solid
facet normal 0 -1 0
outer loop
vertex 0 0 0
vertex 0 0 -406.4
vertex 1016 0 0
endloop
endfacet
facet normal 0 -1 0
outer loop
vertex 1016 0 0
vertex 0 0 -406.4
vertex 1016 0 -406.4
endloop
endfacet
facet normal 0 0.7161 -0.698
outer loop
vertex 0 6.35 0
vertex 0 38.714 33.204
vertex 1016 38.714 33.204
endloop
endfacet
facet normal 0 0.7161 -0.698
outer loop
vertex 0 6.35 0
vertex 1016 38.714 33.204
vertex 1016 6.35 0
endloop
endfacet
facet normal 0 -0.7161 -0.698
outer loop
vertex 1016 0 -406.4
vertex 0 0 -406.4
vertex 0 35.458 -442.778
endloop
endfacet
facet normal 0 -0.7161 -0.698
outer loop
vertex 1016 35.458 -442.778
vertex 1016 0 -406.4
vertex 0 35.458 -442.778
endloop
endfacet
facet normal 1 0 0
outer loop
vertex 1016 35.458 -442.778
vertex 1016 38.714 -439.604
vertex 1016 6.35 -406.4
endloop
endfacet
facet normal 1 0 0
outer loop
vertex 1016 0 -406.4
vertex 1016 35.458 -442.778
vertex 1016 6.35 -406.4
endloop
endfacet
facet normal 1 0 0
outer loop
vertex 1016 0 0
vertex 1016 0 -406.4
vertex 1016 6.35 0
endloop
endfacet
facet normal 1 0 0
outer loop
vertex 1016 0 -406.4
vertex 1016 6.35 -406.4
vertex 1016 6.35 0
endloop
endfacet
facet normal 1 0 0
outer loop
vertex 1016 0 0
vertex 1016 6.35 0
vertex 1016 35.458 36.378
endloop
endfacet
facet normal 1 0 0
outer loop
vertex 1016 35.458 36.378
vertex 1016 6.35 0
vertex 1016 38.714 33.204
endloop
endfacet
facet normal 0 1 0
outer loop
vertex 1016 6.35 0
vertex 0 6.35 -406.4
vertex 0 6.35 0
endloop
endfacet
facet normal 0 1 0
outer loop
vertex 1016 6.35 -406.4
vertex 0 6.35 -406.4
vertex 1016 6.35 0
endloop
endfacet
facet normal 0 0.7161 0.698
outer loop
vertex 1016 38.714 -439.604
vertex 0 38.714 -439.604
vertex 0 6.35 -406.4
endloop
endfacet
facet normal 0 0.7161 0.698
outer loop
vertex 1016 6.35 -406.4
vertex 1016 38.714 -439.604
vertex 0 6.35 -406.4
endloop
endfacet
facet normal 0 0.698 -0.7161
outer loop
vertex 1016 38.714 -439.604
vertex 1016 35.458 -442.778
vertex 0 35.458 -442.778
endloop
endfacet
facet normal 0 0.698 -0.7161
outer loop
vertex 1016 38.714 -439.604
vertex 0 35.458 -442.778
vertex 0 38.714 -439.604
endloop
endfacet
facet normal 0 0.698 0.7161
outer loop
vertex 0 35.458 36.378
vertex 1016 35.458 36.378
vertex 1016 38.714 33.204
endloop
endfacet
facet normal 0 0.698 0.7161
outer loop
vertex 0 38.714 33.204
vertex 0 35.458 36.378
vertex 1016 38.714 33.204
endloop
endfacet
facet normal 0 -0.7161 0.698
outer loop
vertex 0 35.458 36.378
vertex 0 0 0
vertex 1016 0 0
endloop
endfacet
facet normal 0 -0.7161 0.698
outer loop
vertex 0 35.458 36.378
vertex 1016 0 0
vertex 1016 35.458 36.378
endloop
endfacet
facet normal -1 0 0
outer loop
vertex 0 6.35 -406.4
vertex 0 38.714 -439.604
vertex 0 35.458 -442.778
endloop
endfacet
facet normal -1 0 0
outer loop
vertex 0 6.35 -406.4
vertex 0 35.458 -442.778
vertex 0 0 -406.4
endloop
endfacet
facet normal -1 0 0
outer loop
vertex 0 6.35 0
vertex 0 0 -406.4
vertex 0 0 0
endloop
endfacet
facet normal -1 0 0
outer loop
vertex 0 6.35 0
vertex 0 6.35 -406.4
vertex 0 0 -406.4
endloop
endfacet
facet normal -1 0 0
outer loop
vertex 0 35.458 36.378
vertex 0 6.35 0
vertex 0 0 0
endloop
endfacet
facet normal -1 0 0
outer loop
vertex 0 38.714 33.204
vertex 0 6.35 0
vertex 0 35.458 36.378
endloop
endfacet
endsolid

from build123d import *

# Parameters (mm, degrees)
SKETCH1_W           = 1016
SKETCH1_H           = 406.4
BOSS_EXTRUDE1_DEPTH = 6.35
BOSS_EXTRUDE2_DEPTH = 1016


with BuildPart() as part:
    # Sketch1 → Boss-Extrude1 (new body)
    with BuildSketch(Plane(origin=(0, 0, 0), x_dir=(1, 0, 0), z_dir=(0, 1, 0))):
        with Locations((508, 203.2)):
            Rectangle(SKETCH1_W, SKETCH1_H)
    extrude(amount=BOSS_EXTRUDE1_DEPTH)

    # Sketch2 → Boss-Extrude2 (add)
    with BuildSketch(Plane(origin=(0, 0, 0), x_dir=(0, 0, -1), z_dir=(1, 0, 0))):
        Polygon((0, 0), (-36.378303543, 35.457848656), (-33.204345912, 38.714199465), (0, 6.35), align=None)
        Polygon((406.4, 6.35), (406.4, 0), (442.778303543, 35.457848656), (439.604345912, 38.714199465), align=None)
    extrude(amount=BOSS_EXTRUDE2_DEPTH)


solid = part.part
